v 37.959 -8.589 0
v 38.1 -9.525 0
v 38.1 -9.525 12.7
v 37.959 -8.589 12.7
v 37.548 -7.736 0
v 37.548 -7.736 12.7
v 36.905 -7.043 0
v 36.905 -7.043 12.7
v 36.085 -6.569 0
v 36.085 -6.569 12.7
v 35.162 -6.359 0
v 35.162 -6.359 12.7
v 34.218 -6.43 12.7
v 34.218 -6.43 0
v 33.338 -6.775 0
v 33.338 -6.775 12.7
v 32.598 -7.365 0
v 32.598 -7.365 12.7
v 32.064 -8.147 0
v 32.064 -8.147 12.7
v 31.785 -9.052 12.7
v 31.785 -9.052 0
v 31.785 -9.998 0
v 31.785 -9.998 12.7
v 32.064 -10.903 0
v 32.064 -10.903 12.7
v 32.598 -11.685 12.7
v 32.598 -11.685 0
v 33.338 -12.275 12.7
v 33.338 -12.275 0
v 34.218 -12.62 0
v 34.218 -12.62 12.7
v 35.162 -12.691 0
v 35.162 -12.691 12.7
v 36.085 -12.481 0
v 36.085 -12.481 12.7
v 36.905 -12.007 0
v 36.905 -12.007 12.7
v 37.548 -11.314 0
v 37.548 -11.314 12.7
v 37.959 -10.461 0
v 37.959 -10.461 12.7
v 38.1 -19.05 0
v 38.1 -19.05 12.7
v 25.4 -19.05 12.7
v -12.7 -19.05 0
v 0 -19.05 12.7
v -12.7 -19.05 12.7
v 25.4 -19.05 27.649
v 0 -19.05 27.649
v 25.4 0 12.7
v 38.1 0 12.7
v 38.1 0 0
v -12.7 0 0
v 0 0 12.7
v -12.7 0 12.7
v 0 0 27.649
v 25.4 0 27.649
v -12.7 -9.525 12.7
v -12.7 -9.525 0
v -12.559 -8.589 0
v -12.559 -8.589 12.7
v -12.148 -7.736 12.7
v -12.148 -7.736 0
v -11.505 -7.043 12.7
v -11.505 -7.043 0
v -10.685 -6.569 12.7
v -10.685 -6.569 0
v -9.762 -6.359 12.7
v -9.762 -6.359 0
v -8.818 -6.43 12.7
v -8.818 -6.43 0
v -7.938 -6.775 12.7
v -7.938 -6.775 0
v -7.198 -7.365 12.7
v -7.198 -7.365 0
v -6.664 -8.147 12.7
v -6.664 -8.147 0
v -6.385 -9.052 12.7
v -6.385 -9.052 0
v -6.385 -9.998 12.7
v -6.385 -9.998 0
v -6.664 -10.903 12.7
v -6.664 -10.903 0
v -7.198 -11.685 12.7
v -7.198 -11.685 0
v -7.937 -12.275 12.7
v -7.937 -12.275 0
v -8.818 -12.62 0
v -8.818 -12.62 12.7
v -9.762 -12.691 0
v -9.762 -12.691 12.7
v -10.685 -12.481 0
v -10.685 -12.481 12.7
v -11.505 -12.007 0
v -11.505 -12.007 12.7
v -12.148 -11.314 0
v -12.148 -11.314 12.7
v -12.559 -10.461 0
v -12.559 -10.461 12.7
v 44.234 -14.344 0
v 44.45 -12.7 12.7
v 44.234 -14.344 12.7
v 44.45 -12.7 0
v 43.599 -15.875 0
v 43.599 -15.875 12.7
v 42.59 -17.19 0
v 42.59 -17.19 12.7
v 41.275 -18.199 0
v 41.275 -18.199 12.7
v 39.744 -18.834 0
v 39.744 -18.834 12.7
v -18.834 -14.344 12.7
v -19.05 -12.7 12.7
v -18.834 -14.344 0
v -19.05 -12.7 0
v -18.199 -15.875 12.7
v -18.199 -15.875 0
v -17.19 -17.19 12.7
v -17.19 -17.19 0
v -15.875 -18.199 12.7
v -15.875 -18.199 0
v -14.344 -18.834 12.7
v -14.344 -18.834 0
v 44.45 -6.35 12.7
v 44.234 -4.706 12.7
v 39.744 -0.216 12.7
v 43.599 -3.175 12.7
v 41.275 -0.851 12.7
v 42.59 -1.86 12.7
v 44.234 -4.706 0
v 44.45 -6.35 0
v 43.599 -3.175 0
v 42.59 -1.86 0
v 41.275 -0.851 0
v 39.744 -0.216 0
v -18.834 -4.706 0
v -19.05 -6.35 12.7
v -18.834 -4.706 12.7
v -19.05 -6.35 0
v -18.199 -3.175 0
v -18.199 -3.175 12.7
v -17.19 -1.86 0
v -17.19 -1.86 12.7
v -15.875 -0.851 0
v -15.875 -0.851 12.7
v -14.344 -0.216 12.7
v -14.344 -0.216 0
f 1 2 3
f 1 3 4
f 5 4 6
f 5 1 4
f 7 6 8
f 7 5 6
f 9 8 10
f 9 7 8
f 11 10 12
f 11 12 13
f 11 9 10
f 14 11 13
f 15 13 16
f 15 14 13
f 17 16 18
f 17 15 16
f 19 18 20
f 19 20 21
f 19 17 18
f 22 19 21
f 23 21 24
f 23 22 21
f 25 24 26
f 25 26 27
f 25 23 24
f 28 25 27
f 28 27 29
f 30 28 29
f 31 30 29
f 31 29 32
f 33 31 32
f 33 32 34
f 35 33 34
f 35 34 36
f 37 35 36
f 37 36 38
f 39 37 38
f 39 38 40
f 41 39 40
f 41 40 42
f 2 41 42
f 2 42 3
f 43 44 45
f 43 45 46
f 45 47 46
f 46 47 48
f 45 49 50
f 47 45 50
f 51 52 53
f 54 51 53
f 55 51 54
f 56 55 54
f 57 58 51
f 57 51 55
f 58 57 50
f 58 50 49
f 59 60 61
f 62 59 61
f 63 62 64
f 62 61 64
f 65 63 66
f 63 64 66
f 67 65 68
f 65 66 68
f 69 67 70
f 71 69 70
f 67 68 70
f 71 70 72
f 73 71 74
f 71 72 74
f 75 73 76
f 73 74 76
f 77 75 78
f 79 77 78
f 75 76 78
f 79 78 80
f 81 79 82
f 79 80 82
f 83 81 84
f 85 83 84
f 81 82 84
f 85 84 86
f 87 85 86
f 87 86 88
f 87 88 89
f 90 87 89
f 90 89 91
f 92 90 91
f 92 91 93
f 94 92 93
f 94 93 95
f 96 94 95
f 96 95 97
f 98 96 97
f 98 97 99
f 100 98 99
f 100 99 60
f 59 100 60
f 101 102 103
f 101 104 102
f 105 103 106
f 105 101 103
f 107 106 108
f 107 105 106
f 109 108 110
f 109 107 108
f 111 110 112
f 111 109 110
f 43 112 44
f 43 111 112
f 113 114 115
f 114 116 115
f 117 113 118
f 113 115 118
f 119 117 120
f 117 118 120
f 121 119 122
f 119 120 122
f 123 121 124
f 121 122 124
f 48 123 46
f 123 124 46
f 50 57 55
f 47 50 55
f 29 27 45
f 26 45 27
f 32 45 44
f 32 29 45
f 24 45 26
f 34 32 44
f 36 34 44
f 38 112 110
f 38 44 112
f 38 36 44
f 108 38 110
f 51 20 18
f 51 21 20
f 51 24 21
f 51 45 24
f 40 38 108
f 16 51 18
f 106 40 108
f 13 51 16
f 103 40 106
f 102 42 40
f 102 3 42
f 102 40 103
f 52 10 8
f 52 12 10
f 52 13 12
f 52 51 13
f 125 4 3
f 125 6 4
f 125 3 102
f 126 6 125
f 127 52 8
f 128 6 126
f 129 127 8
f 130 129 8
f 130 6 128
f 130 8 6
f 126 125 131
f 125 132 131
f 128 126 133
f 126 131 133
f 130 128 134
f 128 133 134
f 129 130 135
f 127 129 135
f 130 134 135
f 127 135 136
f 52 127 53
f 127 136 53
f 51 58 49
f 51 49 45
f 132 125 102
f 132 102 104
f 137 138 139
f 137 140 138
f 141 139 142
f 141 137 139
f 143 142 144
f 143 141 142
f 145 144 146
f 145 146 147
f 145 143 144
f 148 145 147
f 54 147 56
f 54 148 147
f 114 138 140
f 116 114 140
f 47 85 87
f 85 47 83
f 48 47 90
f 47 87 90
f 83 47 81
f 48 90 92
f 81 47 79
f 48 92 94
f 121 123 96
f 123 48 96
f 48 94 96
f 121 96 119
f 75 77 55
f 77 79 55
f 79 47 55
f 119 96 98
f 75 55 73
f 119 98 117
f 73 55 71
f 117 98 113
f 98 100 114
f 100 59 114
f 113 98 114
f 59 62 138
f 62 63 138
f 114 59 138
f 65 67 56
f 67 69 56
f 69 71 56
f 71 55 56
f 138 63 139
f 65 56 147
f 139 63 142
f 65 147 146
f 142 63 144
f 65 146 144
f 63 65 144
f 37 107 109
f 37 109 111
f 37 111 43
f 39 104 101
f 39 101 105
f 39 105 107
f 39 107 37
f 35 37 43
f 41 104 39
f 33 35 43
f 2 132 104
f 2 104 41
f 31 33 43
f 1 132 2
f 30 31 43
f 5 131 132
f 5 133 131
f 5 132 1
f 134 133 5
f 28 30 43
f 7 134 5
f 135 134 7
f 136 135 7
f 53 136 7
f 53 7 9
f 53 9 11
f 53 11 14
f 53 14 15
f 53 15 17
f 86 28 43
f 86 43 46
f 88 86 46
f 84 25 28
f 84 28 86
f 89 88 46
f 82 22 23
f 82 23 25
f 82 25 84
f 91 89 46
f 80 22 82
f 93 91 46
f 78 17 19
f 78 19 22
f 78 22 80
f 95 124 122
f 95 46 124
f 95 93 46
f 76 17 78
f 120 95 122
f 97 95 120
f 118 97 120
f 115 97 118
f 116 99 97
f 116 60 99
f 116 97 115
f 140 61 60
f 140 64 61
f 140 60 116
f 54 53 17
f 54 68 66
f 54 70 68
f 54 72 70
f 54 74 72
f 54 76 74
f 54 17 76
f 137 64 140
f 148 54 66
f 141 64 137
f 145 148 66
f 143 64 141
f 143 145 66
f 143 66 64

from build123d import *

# Parameters (mm, degrees)
F1_DEPTH = 19.05
F3_D     = 6.35
F4_R     = 6.35


with BuildPart() as f1:
    # F0 (on Front) → F1 (new body)
    with BuildSketch(Plane.XZ):
        Polygon((-19.05, 0), (0, 0), (12.7, 0), (12.7, 27.648715), (0, 27.648715), (0, 12.7), (-19.05, 12.7), align=None)
    extrude(amount=F1_DEPTH)

    # F3 (through all)
    with Locations(Plane.XY.offset(12.7)):
        with Locations((-9.525, -9.525)):
            Hole(F3_D / 2)

    # F4
    f4_edges = [f1.edges().sort_by_distance(p)[0] for p in [
        (-19.05, 0, 6.35),
        (-19.05, -19.05, 6.35),
    ]]
    fillet(f4_edges, radius=F4_R)

    # F5: F1 across face


with BuildPart() as f1_1:
    add(f1.part)
    add(f1.part.mirror(Plane(origin=(12.7, -9.525, 13.824358), x_dir=(0, 1, 0), z_dir=(1, 0, 0))))


solid = f1_1.part
